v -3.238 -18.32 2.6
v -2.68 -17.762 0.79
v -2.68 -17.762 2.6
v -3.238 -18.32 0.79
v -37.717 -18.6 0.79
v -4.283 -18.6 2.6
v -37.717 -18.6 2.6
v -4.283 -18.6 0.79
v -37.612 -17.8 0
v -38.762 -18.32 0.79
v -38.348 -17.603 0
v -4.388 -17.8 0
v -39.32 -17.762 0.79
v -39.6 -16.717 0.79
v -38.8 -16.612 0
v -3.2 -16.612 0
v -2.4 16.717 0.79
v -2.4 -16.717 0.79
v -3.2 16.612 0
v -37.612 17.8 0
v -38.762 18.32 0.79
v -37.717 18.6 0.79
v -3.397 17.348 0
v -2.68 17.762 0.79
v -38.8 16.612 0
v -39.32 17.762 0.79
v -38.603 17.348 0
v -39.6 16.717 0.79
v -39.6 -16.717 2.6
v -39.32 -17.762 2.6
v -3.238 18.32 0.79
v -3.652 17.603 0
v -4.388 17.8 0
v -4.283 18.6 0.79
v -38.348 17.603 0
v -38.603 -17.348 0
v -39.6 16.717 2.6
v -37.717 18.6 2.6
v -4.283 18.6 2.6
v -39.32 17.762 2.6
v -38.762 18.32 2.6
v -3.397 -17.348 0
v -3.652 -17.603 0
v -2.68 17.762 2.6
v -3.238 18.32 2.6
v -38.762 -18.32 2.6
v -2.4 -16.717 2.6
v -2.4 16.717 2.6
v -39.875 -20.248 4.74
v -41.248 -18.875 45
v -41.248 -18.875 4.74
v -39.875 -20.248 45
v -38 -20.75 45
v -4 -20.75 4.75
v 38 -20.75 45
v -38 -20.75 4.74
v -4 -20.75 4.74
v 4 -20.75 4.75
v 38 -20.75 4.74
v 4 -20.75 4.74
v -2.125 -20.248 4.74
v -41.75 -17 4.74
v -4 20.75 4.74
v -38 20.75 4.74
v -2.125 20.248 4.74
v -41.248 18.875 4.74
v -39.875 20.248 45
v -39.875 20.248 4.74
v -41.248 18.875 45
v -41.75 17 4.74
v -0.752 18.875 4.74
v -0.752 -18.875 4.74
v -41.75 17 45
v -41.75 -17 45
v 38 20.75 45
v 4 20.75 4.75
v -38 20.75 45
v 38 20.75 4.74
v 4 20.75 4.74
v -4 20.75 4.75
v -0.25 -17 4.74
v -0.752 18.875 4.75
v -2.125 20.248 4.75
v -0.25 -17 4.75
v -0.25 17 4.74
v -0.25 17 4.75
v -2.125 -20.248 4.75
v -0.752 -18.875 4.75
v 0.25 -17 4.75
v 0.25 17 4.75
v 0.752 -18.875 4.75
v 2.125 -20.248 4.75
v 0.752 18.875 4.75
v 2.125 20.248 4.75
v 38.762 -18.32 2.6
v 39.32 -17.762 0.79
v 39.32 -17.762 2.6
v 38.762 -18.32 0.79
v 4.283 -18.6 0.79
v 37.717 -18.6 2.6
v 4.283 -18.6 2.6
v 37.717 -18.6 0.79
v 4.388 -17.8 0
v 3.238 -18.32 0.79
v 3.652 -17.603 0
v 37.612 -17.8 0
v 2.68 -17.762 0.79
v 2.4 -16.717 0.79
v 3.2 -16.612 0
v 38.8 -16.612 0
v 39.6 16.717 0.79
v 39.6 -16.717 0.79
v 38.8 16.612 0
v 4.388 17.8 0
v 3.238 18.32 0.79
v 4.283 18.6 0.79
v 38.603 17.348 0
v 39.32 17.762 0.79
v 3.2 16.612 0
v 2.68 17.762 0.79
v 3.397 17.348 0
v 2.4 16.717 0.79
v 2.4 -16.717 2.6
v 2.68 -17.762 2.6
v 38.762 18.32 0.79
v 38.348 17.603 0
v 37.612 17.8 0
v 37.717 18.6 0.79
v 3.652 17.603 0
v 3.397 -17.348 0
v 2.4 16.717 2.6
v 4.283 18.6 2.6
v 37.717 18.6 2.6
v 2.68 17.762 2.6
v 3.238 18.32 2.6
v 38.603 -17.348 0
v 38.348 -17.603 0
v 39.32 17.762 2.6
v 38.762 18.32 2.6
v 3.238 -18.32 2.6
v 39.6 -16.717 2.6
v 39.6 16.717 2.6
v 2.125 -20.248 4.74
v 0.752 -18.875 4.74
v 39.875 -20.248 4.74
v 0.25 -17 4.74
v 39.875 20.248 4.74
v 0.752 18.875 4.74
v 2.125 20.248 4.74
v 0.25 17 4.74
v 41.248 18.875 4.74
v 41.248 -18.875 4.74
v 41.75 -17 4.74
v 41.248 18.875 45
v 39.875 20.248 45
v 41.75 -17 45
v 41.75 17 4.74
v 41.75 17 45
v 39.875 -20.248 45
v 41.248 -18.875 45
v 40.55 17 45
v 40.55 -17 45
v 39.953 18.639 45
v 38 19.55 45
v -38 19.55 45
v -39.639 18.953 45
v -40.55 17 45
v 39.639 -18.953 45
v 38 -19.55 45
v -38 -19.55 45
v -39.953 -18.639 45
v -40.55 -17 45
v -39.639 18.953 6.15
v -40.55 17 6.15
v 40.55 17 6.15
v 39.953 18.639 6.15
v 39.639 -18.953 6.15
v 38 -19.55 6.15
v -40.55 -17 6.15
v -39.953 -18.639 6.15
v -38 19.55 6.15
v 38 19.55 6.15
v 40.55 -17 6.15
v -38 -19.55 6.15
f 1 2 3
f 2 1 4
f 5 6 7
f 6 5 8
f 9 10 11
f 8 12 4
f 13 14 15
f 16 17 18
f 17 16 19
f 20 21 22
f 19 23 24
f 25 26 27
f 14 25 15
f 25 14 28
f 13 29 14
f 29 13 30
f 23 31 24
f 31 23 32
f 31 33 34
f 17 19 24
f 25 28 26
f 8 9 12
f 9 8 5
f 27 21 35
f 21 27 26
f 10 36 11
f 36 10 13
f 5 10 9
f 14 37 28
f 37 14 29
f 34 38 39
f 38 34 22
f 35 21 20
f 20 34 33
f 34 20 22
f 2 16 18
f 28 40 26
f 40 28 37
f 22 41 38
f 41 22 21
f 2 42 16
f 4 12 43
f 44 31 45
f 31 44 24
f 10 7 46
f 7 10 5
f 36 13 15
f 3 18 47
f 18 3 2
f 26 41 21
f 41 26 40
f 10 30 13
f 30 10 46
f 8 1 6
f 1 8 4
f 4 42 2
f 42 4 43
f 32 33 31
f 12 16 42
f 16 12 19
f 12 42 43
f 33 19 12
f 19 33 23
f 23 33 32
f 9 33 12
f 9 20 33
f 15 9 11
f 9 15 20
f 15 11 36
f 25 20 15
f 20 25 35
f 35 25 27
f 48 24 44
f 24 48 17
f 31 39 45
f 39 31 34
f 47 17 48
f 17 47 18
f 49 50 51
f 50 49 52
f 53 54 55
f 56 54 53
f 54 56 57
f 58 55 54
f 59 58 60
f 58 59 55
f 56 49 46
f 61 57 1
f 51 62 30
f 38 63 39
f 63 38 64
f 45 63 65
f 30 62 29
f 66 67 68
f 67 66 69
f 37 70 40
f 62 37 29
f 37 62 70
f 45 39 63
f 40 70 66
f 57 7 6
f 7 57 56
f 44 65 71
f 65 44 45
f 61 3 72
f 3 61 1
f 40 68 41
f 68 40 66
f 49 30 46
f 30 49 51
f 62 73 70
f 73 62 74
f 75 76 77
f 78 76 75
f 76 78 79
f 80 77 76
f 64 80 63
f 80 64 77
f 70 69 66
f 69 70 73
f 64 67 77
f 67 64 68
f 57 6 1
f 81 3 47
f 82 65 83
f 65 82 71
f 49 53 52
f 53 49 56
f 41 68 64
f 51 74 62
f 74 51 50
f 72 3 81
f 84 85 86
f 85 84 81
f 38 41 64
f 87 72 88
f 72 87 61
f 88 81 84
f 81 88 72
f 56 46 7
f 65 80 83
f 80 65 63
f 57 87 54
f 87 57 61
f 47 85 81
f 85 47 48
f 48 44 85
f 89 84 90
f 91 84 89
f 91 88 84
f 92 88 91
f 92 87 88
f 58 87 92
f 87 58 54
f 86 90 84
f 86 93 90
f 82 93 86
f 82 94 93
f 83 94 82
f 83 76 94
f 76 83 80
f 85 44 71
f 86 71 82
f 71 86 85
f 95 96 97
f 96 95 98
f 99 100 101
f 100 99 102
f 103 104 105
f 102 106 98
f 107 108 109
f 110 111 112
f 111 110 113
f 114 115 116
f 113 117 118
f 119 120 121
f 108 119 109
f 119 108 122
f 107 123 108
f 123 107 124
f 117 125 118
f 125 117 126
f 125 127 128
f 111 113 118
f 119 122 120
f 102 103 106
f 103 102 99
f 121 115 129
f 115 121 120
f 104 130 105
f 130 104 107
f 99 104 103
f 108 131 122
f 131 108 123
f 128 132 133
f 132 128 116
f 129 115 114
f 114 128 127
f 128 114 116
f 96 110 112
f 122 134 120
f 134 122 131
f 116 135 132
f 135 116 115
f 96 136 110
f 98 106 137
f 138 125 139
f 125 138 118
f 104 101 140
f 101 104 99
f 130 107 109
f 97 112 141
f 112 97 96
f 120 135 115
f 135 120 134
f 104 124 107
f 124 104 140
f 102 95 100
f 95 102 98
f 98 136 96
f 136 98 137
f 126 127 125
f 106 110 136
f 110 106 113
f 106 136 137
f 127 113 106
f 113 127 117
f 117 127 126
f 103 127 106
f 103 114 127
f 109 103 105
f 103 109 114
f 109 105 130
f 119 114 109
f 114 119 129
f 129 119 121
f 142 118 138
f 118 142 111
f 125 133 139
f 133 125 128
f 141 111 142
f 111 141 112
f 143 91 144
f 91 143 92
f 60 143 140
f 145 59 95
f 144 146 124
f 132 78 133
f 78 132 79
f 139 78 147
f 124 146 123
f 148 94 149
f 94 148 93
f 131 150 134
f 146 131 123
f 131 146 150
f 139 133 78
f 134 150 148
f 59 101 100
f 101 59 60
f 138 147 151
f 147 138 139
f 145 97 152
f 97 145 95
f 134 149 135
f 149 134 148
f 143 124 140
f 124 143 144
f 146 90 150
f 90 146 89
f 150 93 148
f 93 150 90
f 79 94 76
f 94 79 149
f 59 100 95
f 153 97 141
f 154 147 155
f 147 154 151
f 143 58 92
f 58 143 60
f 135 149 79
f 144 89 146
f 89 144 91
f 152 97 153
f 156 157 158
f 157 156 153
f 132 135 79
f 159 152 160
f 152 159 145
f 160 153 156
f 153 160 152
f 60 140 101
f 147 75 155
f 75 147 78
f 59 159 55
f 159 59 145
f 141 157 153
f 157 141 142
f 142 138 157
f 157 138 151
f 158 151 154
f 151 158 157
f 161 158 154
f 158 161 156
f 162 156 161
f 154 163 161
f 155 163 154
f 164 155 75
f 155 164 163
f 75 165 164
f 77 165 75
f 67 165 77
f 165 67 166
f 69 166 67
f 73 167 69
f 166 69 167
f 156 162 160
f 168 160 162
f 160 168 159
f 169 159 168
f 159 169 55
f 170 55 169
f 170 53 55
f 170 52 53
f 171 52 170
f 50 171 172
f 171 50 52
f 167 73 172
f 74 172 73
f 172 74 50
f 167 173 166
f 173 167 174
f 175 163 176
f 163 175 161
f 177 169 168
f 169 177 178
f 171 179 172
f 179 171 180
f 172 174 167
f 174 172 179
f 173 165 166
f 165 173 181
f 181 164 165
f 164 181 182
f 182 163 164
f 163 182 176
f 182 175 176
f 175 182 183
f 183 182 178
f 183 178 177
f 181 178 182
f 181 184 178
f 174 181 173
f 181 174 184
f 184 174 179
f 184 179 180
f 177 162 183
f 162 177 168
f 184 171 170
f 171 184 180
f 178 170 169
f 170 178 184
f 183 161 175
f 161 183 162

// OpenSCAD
// file: ../lib/vessel.scad
// SPDX-License-Identifier: MIT
// Copyright (c) 2026 Aaron Cupp
//
// vessel.scad — parametric collar cups for bottles, cans, and pen-form tools.
//
// A collar cup is a solid Gridfinity block with cylindrical bores sunk into it.
// It LOCATES a vessel; it does not clamp one. That distinction is the whole
// design: a collar that grips harder than the bin weighs comes out of the
// baseplate with the bottle when you grab it one-handed. Clearance, not
// interference — CLR is per-diameter, not per-side.
//
// Capture depth is roughly a third of the vessel's height. Enough to resist a
// knock (this bench sits under a 180 W fume-extractor intake), not so much that
// you're fishing the bottle out.
//
//   collar_cup(nx, ny, vessel_d, capture_h, …)   — one centred bore
//   collar_cup_multi(nx, ny, bores, capture_h, …) — bores = [[x, y, d], …]
//
// Cord slot: pen-form tools that stand in a cup are usually corded (the HARDELL
// rotary tool takes a barrel jack). Without a slot the lead drapes over the rim
// and levers the tool sideways. `cord_w > 0` cuts a channel from the bore out
// through the wall, open to the top.

include <gridfinity.scad>

CLR      = 1.0;   // bore = vessel_d + CLR. Loose on purpose — see above.
MIN_WALL = 1.2;   // minimum material between two bores, and bore to outer face

// ---- geometry guards ----
// Overlapping bores and bores that break out through the side wall both still
// render as perfectly watertight, 2-manifold meshes — CI cannot tell you the
// part is wrong, only that it is closed. These asserts encode the intent that
// the mesh check can't. Cheap, and they fire at render time rather than on the
// printer.
function _pair_gaps(bores, clr) = [
    for (i = [0 : len(bores)-1], j = [0 : len(bores)-1]) if (i < j)
        norm([bores[i][0]-bores[j][0], bores[i][1]-bores[j][1]])
        - (bores[i][2]+clr)/2 - (bores[j][2]+clr)/2
];
function _edge_gaps(bores, clr, W, D) = [
    for (b = bores) min(W/2 - abs(b[0]) - (b[2]+clr)/2,
                        D/2 - abs(b[1]) - (b[2]+clr)/2)
];

// Multi-bore block. Bores are [x, y, diameter] in mm, relative to the block centre.
module collar_cup_multi(nx, ny, bores, capture_h, floor = 1.4, clr = CLR,
                        cord_w = 0, cord_at = 0, min_wall = MIN_WALL) {
    h = BIN_BASE_H + floor + capture_h;
    e = 0.1;
    W = nx*GF - 0.5; D = ny*GF - 0.5;
    _pg = _pair_gaps(bores, clr);
    _eg = _edge_gaps(bores, clr, W, D);
    assert(len(_pg) == 0 || min(_pg) >= min_wall,
           "collar_cup: bores are too close — they would merge into one pocket");
    assert(min(_eg) >= min_wall,
           "collar_cup: a bore breaches the outer wall — block needs more units");
    difference() {
        bin_blank(nx, ny, h);
        for (b = bores)
            translate([b[0], b[1], BIN_BASE_H + floor])
                cylinder(d = b[2] + clr, h = capture_h + e, $fn = 96);
        // Cord channel: from the first bore outward through the +X wall, open to
        // the rim so the lead drops in from above rather than threading.
        if (cord_w > 0)
            translate([bores[0][0], bores[0][1] - cord_w/2, BIN_BASE_H + floor + cord_at])
                cube([nx*GF, cord_w, h]);
    }
}

// Single centred bore — the common case.
module collar_cup(nx, ny, vessel_d, capture_h, floor = 1.4, clr = CLR,
                  cord_w = 0, cord_at = 0, min_wall = MIN_WALL) {
    collar_cup_multi(nx, ny, [[0, 0, vessel_d]], capture_h, floor, clr,
                     cord_w, cord_at, min_wall);
}

// Evenly spaced row of same-depth bores along X — for a rank of aerosol cans.
// Returns geometry, not a list; pass the diameters and it lays them out on the
// block's centre line.
module collar_cup_row(nx, ny, diameters, capture_h, floor = 1.4, clr = CLR,
                      min_wall = MIN_WALL) {
    n = len(diameters);
    pitch = nx * GF / n;
    collar_cup_multi(nx, ny,
        [for (i = [0 : n-1]) [(i - (n-1)/2) * pitch, 0, diameters[i]]],
        capture_h, floor, clr, 0, 0, min_wall);
}
// file: cleaning_station_common.scad
// cleaning_station_common.scad — shared parameters for the bench cleaning station.
//
// The IPA / contact-cleaner corner of the electronics repair bench. Everything
// here is measured off the actual items with calipers; nothing is a nominal from
// a product page. Diameters carry a per-diameter clearance (lib/vessel.scad CLR),
// not per-side.
//
// This corner sits under a fume-extractor intake, which drives two decisions:
//   * Cups CAPTURE the vessel rather than clamp it — a collar that grips harder
//     than the bin weighs lifts out of the baseplate with the bottle.
//   * Bins stay as low as the job allows. Capture velocity is decided in the
//     first six inches, and a wall of tall bins in front of the hood costs it.
//
// The aerosols are FLAMMABLE and this bench has a 400 °C iron on it. These cups
// are for working cans only; bulk stock belongs away from the hood entirely.
//
// SPDX-License-Identifier: CC-BY-NC-SA-4.0
// Copyright (c) 2026 Aaron Cupp

include <../lib/vessel.scad>

// ---- measured diameters (mm) ----
// DeoxIT bore: taken from the PART, not from a can measurement.
//
// The 2026-08-20 print had three bores — 57.00 / 55.20 / 52.75. The 57.00 fits a
// DeoxIT; 55.20 barely does; 52.75 holds nothing. So 57.00 is a validated bore,
// which beats re-deriving it from a can diameter plus a clearance guess. D5, F5
// and G5 are the same can, so one bore serves all three.
BORE_DEOXIT = 57.00;   // ✅ proven by the printed part

// Freeze spray is a DIFFERENT, LARGER can — 13 mm wider than a DeoxIT, which is
// why it never fitted a shared block.
D_FREEZE_SPRAY = 69.00;   // ✅ measured 2026-08-20 (was 56.00, badly wrong)
FREEZE_CLR     = 2.0;     // [1:0.5:4] -> 71.00 bore
FREEZE_MEASURED = true;

D_DISPENSER    = 53.50;   // 200 ml push-down alcohol pump, square base across flats
D_FLOOD_BOTTLE = 75.50;

// DeoxIT D100 / F100 / G100 concentrate droppers — bare bottles, out of their
// kit boxes. The boxes are a full 2×1 EACH; the three bare bottles share one.
// NOT ROUND — 39 × 20 is a flattened cross-section, not a diameter and a height.
D_DROPPER_L = 39.00;   // measured 2026-08-20, long axis of the footprint
D_DROPPER_W = 20.00;   // measured, short axis
DROPPER_CLR = 1.00;    // per dimension, matching the CLR convention
CAP_DROPPER = 26;      // [8:1:40] capture depth. ⚠️ bottle HEIGHT is unmeasured —
                       //   39 turned out to be a footprint, so the height nobody
                       //   has taken.
                       //   RAISED 15 → 26 on 2026-08-24: at 15 the brushes and
                       //   swabs fell over in their slots. Depth is what resists
                       //   an applicator tipping, and 15 mm of it on a ~100 mm
                       //   brush is almost none. 26 makes the whole block half
                       //   again as tall, which is what was asked for.
                       //   Read the bin_deoxit_droppers header before assuming
                       //   this alone fixes the tipping — it does not.

// ---- melamine sponges (mm) — 3.94 × 2.35 × 0.79 in ----
// Full block as sold. Bulk stock lives in the bag under the desk, ~100 of them;
// none of it competes for grid.
SPONGE_L = 100.1; SPONGE_W = 59.7; SPONGE_T = 20.1;

// WORKING size: a full block is far more sponge than any bench task needs, and
// melamine is consumed by abrasion — quartering one gets four uses out of what
// was one, and the smaller piece reaches between connectors where a 100 mm block
// cannot. Halve across, halve lengthwise.
CUT_L = SPONGE_L / 2;   // 50.05
CUT_W = SPONGE_W / 2;   // 29.85
CUT_T = SPONGE_T;       // 20.1 — unchanged, cuts are through the face

// ---- capture depth ----
// Vessel HEIGHTS were not measured, so this is a judgement call rather than a
// derived third-of-height: 50 mm resists a knock without making the bottles a
// two-handed retrieval. One number to change if the first print feels wrong.
CAPTURE = 50;

// Sponge bin: sponges stand ON EDGE (60 mm tall), ~4 across the 81 mm interior.
// On edge beats flat-stacked — same count in a 68 mm bin instead of a 107 mm one,
// and any sponge can be pinched out rather than peeling off the top of a pile.
// Height is set by a FULL block standing on edge, not a cut one — so one uncut
// block can still ride in the bin as reserve alongside the trimmed pieces.
// Cut pieces are 50 long, which is what lets the footprint drop to 2×2.
SPONGE_BIN_H = SPONGE_W + BIN_BASE_H + 1.4 + 2;   // ≈ 68
// main file
// bin_deoxit_wipes — 2×1 open bin for the small wipes that ship with the DeoxIT
// bottles.
//
// AN OPEN BIN WITH NO WIPE DIMENSION IN IT, the same as its neighbours. The
// wipes have never been on calipers and do not need to be: a bin that only
// contains does not care how big its contents are, and a fitted pocket built on
// an unmeasured guess is how a part ends up unusable.
//
// The only number here is depth, and that is a capacity choice.
//
// 45, NOT 58. Its neighbours — bin_swabs, bin_micro_sponges, bin_cleanroom_wipes
// — all stand at 58 and deliberately line up. This one does not, because these
// are small sachets: in a 58 mm bin they sink to the bottom of a 52 mm well and
// you fish for them. Reaching in beats looking tidy. Change H to 58 if the row
// mattering more is the call.
//
// PRINT: as emitted, feet down. No supports.
//
// SPDX-License-Identifier: CC-BY-NC-SA-4.0
// Copyright (c) 2026 Aaron Cupp
include <cleaning_station_common.scad>
include <../lib/gridfinity.scad>

NX = 2; NY = 1;
H  = 45;    // [20:1:70] ~39 mm usable

WALL = 1.2; FLOOR = 1.4;

echo(str("interior ", NX*GF - 0.5 - 2*WALL, " x ", NY*GF - 0.5 - 2*WALL,
         " mm, usable depth ", H - BIN_BASE_H - FLOOR, " mm"));

bin(NX, NY, H, wall = WALL, floor = FLOOR);
